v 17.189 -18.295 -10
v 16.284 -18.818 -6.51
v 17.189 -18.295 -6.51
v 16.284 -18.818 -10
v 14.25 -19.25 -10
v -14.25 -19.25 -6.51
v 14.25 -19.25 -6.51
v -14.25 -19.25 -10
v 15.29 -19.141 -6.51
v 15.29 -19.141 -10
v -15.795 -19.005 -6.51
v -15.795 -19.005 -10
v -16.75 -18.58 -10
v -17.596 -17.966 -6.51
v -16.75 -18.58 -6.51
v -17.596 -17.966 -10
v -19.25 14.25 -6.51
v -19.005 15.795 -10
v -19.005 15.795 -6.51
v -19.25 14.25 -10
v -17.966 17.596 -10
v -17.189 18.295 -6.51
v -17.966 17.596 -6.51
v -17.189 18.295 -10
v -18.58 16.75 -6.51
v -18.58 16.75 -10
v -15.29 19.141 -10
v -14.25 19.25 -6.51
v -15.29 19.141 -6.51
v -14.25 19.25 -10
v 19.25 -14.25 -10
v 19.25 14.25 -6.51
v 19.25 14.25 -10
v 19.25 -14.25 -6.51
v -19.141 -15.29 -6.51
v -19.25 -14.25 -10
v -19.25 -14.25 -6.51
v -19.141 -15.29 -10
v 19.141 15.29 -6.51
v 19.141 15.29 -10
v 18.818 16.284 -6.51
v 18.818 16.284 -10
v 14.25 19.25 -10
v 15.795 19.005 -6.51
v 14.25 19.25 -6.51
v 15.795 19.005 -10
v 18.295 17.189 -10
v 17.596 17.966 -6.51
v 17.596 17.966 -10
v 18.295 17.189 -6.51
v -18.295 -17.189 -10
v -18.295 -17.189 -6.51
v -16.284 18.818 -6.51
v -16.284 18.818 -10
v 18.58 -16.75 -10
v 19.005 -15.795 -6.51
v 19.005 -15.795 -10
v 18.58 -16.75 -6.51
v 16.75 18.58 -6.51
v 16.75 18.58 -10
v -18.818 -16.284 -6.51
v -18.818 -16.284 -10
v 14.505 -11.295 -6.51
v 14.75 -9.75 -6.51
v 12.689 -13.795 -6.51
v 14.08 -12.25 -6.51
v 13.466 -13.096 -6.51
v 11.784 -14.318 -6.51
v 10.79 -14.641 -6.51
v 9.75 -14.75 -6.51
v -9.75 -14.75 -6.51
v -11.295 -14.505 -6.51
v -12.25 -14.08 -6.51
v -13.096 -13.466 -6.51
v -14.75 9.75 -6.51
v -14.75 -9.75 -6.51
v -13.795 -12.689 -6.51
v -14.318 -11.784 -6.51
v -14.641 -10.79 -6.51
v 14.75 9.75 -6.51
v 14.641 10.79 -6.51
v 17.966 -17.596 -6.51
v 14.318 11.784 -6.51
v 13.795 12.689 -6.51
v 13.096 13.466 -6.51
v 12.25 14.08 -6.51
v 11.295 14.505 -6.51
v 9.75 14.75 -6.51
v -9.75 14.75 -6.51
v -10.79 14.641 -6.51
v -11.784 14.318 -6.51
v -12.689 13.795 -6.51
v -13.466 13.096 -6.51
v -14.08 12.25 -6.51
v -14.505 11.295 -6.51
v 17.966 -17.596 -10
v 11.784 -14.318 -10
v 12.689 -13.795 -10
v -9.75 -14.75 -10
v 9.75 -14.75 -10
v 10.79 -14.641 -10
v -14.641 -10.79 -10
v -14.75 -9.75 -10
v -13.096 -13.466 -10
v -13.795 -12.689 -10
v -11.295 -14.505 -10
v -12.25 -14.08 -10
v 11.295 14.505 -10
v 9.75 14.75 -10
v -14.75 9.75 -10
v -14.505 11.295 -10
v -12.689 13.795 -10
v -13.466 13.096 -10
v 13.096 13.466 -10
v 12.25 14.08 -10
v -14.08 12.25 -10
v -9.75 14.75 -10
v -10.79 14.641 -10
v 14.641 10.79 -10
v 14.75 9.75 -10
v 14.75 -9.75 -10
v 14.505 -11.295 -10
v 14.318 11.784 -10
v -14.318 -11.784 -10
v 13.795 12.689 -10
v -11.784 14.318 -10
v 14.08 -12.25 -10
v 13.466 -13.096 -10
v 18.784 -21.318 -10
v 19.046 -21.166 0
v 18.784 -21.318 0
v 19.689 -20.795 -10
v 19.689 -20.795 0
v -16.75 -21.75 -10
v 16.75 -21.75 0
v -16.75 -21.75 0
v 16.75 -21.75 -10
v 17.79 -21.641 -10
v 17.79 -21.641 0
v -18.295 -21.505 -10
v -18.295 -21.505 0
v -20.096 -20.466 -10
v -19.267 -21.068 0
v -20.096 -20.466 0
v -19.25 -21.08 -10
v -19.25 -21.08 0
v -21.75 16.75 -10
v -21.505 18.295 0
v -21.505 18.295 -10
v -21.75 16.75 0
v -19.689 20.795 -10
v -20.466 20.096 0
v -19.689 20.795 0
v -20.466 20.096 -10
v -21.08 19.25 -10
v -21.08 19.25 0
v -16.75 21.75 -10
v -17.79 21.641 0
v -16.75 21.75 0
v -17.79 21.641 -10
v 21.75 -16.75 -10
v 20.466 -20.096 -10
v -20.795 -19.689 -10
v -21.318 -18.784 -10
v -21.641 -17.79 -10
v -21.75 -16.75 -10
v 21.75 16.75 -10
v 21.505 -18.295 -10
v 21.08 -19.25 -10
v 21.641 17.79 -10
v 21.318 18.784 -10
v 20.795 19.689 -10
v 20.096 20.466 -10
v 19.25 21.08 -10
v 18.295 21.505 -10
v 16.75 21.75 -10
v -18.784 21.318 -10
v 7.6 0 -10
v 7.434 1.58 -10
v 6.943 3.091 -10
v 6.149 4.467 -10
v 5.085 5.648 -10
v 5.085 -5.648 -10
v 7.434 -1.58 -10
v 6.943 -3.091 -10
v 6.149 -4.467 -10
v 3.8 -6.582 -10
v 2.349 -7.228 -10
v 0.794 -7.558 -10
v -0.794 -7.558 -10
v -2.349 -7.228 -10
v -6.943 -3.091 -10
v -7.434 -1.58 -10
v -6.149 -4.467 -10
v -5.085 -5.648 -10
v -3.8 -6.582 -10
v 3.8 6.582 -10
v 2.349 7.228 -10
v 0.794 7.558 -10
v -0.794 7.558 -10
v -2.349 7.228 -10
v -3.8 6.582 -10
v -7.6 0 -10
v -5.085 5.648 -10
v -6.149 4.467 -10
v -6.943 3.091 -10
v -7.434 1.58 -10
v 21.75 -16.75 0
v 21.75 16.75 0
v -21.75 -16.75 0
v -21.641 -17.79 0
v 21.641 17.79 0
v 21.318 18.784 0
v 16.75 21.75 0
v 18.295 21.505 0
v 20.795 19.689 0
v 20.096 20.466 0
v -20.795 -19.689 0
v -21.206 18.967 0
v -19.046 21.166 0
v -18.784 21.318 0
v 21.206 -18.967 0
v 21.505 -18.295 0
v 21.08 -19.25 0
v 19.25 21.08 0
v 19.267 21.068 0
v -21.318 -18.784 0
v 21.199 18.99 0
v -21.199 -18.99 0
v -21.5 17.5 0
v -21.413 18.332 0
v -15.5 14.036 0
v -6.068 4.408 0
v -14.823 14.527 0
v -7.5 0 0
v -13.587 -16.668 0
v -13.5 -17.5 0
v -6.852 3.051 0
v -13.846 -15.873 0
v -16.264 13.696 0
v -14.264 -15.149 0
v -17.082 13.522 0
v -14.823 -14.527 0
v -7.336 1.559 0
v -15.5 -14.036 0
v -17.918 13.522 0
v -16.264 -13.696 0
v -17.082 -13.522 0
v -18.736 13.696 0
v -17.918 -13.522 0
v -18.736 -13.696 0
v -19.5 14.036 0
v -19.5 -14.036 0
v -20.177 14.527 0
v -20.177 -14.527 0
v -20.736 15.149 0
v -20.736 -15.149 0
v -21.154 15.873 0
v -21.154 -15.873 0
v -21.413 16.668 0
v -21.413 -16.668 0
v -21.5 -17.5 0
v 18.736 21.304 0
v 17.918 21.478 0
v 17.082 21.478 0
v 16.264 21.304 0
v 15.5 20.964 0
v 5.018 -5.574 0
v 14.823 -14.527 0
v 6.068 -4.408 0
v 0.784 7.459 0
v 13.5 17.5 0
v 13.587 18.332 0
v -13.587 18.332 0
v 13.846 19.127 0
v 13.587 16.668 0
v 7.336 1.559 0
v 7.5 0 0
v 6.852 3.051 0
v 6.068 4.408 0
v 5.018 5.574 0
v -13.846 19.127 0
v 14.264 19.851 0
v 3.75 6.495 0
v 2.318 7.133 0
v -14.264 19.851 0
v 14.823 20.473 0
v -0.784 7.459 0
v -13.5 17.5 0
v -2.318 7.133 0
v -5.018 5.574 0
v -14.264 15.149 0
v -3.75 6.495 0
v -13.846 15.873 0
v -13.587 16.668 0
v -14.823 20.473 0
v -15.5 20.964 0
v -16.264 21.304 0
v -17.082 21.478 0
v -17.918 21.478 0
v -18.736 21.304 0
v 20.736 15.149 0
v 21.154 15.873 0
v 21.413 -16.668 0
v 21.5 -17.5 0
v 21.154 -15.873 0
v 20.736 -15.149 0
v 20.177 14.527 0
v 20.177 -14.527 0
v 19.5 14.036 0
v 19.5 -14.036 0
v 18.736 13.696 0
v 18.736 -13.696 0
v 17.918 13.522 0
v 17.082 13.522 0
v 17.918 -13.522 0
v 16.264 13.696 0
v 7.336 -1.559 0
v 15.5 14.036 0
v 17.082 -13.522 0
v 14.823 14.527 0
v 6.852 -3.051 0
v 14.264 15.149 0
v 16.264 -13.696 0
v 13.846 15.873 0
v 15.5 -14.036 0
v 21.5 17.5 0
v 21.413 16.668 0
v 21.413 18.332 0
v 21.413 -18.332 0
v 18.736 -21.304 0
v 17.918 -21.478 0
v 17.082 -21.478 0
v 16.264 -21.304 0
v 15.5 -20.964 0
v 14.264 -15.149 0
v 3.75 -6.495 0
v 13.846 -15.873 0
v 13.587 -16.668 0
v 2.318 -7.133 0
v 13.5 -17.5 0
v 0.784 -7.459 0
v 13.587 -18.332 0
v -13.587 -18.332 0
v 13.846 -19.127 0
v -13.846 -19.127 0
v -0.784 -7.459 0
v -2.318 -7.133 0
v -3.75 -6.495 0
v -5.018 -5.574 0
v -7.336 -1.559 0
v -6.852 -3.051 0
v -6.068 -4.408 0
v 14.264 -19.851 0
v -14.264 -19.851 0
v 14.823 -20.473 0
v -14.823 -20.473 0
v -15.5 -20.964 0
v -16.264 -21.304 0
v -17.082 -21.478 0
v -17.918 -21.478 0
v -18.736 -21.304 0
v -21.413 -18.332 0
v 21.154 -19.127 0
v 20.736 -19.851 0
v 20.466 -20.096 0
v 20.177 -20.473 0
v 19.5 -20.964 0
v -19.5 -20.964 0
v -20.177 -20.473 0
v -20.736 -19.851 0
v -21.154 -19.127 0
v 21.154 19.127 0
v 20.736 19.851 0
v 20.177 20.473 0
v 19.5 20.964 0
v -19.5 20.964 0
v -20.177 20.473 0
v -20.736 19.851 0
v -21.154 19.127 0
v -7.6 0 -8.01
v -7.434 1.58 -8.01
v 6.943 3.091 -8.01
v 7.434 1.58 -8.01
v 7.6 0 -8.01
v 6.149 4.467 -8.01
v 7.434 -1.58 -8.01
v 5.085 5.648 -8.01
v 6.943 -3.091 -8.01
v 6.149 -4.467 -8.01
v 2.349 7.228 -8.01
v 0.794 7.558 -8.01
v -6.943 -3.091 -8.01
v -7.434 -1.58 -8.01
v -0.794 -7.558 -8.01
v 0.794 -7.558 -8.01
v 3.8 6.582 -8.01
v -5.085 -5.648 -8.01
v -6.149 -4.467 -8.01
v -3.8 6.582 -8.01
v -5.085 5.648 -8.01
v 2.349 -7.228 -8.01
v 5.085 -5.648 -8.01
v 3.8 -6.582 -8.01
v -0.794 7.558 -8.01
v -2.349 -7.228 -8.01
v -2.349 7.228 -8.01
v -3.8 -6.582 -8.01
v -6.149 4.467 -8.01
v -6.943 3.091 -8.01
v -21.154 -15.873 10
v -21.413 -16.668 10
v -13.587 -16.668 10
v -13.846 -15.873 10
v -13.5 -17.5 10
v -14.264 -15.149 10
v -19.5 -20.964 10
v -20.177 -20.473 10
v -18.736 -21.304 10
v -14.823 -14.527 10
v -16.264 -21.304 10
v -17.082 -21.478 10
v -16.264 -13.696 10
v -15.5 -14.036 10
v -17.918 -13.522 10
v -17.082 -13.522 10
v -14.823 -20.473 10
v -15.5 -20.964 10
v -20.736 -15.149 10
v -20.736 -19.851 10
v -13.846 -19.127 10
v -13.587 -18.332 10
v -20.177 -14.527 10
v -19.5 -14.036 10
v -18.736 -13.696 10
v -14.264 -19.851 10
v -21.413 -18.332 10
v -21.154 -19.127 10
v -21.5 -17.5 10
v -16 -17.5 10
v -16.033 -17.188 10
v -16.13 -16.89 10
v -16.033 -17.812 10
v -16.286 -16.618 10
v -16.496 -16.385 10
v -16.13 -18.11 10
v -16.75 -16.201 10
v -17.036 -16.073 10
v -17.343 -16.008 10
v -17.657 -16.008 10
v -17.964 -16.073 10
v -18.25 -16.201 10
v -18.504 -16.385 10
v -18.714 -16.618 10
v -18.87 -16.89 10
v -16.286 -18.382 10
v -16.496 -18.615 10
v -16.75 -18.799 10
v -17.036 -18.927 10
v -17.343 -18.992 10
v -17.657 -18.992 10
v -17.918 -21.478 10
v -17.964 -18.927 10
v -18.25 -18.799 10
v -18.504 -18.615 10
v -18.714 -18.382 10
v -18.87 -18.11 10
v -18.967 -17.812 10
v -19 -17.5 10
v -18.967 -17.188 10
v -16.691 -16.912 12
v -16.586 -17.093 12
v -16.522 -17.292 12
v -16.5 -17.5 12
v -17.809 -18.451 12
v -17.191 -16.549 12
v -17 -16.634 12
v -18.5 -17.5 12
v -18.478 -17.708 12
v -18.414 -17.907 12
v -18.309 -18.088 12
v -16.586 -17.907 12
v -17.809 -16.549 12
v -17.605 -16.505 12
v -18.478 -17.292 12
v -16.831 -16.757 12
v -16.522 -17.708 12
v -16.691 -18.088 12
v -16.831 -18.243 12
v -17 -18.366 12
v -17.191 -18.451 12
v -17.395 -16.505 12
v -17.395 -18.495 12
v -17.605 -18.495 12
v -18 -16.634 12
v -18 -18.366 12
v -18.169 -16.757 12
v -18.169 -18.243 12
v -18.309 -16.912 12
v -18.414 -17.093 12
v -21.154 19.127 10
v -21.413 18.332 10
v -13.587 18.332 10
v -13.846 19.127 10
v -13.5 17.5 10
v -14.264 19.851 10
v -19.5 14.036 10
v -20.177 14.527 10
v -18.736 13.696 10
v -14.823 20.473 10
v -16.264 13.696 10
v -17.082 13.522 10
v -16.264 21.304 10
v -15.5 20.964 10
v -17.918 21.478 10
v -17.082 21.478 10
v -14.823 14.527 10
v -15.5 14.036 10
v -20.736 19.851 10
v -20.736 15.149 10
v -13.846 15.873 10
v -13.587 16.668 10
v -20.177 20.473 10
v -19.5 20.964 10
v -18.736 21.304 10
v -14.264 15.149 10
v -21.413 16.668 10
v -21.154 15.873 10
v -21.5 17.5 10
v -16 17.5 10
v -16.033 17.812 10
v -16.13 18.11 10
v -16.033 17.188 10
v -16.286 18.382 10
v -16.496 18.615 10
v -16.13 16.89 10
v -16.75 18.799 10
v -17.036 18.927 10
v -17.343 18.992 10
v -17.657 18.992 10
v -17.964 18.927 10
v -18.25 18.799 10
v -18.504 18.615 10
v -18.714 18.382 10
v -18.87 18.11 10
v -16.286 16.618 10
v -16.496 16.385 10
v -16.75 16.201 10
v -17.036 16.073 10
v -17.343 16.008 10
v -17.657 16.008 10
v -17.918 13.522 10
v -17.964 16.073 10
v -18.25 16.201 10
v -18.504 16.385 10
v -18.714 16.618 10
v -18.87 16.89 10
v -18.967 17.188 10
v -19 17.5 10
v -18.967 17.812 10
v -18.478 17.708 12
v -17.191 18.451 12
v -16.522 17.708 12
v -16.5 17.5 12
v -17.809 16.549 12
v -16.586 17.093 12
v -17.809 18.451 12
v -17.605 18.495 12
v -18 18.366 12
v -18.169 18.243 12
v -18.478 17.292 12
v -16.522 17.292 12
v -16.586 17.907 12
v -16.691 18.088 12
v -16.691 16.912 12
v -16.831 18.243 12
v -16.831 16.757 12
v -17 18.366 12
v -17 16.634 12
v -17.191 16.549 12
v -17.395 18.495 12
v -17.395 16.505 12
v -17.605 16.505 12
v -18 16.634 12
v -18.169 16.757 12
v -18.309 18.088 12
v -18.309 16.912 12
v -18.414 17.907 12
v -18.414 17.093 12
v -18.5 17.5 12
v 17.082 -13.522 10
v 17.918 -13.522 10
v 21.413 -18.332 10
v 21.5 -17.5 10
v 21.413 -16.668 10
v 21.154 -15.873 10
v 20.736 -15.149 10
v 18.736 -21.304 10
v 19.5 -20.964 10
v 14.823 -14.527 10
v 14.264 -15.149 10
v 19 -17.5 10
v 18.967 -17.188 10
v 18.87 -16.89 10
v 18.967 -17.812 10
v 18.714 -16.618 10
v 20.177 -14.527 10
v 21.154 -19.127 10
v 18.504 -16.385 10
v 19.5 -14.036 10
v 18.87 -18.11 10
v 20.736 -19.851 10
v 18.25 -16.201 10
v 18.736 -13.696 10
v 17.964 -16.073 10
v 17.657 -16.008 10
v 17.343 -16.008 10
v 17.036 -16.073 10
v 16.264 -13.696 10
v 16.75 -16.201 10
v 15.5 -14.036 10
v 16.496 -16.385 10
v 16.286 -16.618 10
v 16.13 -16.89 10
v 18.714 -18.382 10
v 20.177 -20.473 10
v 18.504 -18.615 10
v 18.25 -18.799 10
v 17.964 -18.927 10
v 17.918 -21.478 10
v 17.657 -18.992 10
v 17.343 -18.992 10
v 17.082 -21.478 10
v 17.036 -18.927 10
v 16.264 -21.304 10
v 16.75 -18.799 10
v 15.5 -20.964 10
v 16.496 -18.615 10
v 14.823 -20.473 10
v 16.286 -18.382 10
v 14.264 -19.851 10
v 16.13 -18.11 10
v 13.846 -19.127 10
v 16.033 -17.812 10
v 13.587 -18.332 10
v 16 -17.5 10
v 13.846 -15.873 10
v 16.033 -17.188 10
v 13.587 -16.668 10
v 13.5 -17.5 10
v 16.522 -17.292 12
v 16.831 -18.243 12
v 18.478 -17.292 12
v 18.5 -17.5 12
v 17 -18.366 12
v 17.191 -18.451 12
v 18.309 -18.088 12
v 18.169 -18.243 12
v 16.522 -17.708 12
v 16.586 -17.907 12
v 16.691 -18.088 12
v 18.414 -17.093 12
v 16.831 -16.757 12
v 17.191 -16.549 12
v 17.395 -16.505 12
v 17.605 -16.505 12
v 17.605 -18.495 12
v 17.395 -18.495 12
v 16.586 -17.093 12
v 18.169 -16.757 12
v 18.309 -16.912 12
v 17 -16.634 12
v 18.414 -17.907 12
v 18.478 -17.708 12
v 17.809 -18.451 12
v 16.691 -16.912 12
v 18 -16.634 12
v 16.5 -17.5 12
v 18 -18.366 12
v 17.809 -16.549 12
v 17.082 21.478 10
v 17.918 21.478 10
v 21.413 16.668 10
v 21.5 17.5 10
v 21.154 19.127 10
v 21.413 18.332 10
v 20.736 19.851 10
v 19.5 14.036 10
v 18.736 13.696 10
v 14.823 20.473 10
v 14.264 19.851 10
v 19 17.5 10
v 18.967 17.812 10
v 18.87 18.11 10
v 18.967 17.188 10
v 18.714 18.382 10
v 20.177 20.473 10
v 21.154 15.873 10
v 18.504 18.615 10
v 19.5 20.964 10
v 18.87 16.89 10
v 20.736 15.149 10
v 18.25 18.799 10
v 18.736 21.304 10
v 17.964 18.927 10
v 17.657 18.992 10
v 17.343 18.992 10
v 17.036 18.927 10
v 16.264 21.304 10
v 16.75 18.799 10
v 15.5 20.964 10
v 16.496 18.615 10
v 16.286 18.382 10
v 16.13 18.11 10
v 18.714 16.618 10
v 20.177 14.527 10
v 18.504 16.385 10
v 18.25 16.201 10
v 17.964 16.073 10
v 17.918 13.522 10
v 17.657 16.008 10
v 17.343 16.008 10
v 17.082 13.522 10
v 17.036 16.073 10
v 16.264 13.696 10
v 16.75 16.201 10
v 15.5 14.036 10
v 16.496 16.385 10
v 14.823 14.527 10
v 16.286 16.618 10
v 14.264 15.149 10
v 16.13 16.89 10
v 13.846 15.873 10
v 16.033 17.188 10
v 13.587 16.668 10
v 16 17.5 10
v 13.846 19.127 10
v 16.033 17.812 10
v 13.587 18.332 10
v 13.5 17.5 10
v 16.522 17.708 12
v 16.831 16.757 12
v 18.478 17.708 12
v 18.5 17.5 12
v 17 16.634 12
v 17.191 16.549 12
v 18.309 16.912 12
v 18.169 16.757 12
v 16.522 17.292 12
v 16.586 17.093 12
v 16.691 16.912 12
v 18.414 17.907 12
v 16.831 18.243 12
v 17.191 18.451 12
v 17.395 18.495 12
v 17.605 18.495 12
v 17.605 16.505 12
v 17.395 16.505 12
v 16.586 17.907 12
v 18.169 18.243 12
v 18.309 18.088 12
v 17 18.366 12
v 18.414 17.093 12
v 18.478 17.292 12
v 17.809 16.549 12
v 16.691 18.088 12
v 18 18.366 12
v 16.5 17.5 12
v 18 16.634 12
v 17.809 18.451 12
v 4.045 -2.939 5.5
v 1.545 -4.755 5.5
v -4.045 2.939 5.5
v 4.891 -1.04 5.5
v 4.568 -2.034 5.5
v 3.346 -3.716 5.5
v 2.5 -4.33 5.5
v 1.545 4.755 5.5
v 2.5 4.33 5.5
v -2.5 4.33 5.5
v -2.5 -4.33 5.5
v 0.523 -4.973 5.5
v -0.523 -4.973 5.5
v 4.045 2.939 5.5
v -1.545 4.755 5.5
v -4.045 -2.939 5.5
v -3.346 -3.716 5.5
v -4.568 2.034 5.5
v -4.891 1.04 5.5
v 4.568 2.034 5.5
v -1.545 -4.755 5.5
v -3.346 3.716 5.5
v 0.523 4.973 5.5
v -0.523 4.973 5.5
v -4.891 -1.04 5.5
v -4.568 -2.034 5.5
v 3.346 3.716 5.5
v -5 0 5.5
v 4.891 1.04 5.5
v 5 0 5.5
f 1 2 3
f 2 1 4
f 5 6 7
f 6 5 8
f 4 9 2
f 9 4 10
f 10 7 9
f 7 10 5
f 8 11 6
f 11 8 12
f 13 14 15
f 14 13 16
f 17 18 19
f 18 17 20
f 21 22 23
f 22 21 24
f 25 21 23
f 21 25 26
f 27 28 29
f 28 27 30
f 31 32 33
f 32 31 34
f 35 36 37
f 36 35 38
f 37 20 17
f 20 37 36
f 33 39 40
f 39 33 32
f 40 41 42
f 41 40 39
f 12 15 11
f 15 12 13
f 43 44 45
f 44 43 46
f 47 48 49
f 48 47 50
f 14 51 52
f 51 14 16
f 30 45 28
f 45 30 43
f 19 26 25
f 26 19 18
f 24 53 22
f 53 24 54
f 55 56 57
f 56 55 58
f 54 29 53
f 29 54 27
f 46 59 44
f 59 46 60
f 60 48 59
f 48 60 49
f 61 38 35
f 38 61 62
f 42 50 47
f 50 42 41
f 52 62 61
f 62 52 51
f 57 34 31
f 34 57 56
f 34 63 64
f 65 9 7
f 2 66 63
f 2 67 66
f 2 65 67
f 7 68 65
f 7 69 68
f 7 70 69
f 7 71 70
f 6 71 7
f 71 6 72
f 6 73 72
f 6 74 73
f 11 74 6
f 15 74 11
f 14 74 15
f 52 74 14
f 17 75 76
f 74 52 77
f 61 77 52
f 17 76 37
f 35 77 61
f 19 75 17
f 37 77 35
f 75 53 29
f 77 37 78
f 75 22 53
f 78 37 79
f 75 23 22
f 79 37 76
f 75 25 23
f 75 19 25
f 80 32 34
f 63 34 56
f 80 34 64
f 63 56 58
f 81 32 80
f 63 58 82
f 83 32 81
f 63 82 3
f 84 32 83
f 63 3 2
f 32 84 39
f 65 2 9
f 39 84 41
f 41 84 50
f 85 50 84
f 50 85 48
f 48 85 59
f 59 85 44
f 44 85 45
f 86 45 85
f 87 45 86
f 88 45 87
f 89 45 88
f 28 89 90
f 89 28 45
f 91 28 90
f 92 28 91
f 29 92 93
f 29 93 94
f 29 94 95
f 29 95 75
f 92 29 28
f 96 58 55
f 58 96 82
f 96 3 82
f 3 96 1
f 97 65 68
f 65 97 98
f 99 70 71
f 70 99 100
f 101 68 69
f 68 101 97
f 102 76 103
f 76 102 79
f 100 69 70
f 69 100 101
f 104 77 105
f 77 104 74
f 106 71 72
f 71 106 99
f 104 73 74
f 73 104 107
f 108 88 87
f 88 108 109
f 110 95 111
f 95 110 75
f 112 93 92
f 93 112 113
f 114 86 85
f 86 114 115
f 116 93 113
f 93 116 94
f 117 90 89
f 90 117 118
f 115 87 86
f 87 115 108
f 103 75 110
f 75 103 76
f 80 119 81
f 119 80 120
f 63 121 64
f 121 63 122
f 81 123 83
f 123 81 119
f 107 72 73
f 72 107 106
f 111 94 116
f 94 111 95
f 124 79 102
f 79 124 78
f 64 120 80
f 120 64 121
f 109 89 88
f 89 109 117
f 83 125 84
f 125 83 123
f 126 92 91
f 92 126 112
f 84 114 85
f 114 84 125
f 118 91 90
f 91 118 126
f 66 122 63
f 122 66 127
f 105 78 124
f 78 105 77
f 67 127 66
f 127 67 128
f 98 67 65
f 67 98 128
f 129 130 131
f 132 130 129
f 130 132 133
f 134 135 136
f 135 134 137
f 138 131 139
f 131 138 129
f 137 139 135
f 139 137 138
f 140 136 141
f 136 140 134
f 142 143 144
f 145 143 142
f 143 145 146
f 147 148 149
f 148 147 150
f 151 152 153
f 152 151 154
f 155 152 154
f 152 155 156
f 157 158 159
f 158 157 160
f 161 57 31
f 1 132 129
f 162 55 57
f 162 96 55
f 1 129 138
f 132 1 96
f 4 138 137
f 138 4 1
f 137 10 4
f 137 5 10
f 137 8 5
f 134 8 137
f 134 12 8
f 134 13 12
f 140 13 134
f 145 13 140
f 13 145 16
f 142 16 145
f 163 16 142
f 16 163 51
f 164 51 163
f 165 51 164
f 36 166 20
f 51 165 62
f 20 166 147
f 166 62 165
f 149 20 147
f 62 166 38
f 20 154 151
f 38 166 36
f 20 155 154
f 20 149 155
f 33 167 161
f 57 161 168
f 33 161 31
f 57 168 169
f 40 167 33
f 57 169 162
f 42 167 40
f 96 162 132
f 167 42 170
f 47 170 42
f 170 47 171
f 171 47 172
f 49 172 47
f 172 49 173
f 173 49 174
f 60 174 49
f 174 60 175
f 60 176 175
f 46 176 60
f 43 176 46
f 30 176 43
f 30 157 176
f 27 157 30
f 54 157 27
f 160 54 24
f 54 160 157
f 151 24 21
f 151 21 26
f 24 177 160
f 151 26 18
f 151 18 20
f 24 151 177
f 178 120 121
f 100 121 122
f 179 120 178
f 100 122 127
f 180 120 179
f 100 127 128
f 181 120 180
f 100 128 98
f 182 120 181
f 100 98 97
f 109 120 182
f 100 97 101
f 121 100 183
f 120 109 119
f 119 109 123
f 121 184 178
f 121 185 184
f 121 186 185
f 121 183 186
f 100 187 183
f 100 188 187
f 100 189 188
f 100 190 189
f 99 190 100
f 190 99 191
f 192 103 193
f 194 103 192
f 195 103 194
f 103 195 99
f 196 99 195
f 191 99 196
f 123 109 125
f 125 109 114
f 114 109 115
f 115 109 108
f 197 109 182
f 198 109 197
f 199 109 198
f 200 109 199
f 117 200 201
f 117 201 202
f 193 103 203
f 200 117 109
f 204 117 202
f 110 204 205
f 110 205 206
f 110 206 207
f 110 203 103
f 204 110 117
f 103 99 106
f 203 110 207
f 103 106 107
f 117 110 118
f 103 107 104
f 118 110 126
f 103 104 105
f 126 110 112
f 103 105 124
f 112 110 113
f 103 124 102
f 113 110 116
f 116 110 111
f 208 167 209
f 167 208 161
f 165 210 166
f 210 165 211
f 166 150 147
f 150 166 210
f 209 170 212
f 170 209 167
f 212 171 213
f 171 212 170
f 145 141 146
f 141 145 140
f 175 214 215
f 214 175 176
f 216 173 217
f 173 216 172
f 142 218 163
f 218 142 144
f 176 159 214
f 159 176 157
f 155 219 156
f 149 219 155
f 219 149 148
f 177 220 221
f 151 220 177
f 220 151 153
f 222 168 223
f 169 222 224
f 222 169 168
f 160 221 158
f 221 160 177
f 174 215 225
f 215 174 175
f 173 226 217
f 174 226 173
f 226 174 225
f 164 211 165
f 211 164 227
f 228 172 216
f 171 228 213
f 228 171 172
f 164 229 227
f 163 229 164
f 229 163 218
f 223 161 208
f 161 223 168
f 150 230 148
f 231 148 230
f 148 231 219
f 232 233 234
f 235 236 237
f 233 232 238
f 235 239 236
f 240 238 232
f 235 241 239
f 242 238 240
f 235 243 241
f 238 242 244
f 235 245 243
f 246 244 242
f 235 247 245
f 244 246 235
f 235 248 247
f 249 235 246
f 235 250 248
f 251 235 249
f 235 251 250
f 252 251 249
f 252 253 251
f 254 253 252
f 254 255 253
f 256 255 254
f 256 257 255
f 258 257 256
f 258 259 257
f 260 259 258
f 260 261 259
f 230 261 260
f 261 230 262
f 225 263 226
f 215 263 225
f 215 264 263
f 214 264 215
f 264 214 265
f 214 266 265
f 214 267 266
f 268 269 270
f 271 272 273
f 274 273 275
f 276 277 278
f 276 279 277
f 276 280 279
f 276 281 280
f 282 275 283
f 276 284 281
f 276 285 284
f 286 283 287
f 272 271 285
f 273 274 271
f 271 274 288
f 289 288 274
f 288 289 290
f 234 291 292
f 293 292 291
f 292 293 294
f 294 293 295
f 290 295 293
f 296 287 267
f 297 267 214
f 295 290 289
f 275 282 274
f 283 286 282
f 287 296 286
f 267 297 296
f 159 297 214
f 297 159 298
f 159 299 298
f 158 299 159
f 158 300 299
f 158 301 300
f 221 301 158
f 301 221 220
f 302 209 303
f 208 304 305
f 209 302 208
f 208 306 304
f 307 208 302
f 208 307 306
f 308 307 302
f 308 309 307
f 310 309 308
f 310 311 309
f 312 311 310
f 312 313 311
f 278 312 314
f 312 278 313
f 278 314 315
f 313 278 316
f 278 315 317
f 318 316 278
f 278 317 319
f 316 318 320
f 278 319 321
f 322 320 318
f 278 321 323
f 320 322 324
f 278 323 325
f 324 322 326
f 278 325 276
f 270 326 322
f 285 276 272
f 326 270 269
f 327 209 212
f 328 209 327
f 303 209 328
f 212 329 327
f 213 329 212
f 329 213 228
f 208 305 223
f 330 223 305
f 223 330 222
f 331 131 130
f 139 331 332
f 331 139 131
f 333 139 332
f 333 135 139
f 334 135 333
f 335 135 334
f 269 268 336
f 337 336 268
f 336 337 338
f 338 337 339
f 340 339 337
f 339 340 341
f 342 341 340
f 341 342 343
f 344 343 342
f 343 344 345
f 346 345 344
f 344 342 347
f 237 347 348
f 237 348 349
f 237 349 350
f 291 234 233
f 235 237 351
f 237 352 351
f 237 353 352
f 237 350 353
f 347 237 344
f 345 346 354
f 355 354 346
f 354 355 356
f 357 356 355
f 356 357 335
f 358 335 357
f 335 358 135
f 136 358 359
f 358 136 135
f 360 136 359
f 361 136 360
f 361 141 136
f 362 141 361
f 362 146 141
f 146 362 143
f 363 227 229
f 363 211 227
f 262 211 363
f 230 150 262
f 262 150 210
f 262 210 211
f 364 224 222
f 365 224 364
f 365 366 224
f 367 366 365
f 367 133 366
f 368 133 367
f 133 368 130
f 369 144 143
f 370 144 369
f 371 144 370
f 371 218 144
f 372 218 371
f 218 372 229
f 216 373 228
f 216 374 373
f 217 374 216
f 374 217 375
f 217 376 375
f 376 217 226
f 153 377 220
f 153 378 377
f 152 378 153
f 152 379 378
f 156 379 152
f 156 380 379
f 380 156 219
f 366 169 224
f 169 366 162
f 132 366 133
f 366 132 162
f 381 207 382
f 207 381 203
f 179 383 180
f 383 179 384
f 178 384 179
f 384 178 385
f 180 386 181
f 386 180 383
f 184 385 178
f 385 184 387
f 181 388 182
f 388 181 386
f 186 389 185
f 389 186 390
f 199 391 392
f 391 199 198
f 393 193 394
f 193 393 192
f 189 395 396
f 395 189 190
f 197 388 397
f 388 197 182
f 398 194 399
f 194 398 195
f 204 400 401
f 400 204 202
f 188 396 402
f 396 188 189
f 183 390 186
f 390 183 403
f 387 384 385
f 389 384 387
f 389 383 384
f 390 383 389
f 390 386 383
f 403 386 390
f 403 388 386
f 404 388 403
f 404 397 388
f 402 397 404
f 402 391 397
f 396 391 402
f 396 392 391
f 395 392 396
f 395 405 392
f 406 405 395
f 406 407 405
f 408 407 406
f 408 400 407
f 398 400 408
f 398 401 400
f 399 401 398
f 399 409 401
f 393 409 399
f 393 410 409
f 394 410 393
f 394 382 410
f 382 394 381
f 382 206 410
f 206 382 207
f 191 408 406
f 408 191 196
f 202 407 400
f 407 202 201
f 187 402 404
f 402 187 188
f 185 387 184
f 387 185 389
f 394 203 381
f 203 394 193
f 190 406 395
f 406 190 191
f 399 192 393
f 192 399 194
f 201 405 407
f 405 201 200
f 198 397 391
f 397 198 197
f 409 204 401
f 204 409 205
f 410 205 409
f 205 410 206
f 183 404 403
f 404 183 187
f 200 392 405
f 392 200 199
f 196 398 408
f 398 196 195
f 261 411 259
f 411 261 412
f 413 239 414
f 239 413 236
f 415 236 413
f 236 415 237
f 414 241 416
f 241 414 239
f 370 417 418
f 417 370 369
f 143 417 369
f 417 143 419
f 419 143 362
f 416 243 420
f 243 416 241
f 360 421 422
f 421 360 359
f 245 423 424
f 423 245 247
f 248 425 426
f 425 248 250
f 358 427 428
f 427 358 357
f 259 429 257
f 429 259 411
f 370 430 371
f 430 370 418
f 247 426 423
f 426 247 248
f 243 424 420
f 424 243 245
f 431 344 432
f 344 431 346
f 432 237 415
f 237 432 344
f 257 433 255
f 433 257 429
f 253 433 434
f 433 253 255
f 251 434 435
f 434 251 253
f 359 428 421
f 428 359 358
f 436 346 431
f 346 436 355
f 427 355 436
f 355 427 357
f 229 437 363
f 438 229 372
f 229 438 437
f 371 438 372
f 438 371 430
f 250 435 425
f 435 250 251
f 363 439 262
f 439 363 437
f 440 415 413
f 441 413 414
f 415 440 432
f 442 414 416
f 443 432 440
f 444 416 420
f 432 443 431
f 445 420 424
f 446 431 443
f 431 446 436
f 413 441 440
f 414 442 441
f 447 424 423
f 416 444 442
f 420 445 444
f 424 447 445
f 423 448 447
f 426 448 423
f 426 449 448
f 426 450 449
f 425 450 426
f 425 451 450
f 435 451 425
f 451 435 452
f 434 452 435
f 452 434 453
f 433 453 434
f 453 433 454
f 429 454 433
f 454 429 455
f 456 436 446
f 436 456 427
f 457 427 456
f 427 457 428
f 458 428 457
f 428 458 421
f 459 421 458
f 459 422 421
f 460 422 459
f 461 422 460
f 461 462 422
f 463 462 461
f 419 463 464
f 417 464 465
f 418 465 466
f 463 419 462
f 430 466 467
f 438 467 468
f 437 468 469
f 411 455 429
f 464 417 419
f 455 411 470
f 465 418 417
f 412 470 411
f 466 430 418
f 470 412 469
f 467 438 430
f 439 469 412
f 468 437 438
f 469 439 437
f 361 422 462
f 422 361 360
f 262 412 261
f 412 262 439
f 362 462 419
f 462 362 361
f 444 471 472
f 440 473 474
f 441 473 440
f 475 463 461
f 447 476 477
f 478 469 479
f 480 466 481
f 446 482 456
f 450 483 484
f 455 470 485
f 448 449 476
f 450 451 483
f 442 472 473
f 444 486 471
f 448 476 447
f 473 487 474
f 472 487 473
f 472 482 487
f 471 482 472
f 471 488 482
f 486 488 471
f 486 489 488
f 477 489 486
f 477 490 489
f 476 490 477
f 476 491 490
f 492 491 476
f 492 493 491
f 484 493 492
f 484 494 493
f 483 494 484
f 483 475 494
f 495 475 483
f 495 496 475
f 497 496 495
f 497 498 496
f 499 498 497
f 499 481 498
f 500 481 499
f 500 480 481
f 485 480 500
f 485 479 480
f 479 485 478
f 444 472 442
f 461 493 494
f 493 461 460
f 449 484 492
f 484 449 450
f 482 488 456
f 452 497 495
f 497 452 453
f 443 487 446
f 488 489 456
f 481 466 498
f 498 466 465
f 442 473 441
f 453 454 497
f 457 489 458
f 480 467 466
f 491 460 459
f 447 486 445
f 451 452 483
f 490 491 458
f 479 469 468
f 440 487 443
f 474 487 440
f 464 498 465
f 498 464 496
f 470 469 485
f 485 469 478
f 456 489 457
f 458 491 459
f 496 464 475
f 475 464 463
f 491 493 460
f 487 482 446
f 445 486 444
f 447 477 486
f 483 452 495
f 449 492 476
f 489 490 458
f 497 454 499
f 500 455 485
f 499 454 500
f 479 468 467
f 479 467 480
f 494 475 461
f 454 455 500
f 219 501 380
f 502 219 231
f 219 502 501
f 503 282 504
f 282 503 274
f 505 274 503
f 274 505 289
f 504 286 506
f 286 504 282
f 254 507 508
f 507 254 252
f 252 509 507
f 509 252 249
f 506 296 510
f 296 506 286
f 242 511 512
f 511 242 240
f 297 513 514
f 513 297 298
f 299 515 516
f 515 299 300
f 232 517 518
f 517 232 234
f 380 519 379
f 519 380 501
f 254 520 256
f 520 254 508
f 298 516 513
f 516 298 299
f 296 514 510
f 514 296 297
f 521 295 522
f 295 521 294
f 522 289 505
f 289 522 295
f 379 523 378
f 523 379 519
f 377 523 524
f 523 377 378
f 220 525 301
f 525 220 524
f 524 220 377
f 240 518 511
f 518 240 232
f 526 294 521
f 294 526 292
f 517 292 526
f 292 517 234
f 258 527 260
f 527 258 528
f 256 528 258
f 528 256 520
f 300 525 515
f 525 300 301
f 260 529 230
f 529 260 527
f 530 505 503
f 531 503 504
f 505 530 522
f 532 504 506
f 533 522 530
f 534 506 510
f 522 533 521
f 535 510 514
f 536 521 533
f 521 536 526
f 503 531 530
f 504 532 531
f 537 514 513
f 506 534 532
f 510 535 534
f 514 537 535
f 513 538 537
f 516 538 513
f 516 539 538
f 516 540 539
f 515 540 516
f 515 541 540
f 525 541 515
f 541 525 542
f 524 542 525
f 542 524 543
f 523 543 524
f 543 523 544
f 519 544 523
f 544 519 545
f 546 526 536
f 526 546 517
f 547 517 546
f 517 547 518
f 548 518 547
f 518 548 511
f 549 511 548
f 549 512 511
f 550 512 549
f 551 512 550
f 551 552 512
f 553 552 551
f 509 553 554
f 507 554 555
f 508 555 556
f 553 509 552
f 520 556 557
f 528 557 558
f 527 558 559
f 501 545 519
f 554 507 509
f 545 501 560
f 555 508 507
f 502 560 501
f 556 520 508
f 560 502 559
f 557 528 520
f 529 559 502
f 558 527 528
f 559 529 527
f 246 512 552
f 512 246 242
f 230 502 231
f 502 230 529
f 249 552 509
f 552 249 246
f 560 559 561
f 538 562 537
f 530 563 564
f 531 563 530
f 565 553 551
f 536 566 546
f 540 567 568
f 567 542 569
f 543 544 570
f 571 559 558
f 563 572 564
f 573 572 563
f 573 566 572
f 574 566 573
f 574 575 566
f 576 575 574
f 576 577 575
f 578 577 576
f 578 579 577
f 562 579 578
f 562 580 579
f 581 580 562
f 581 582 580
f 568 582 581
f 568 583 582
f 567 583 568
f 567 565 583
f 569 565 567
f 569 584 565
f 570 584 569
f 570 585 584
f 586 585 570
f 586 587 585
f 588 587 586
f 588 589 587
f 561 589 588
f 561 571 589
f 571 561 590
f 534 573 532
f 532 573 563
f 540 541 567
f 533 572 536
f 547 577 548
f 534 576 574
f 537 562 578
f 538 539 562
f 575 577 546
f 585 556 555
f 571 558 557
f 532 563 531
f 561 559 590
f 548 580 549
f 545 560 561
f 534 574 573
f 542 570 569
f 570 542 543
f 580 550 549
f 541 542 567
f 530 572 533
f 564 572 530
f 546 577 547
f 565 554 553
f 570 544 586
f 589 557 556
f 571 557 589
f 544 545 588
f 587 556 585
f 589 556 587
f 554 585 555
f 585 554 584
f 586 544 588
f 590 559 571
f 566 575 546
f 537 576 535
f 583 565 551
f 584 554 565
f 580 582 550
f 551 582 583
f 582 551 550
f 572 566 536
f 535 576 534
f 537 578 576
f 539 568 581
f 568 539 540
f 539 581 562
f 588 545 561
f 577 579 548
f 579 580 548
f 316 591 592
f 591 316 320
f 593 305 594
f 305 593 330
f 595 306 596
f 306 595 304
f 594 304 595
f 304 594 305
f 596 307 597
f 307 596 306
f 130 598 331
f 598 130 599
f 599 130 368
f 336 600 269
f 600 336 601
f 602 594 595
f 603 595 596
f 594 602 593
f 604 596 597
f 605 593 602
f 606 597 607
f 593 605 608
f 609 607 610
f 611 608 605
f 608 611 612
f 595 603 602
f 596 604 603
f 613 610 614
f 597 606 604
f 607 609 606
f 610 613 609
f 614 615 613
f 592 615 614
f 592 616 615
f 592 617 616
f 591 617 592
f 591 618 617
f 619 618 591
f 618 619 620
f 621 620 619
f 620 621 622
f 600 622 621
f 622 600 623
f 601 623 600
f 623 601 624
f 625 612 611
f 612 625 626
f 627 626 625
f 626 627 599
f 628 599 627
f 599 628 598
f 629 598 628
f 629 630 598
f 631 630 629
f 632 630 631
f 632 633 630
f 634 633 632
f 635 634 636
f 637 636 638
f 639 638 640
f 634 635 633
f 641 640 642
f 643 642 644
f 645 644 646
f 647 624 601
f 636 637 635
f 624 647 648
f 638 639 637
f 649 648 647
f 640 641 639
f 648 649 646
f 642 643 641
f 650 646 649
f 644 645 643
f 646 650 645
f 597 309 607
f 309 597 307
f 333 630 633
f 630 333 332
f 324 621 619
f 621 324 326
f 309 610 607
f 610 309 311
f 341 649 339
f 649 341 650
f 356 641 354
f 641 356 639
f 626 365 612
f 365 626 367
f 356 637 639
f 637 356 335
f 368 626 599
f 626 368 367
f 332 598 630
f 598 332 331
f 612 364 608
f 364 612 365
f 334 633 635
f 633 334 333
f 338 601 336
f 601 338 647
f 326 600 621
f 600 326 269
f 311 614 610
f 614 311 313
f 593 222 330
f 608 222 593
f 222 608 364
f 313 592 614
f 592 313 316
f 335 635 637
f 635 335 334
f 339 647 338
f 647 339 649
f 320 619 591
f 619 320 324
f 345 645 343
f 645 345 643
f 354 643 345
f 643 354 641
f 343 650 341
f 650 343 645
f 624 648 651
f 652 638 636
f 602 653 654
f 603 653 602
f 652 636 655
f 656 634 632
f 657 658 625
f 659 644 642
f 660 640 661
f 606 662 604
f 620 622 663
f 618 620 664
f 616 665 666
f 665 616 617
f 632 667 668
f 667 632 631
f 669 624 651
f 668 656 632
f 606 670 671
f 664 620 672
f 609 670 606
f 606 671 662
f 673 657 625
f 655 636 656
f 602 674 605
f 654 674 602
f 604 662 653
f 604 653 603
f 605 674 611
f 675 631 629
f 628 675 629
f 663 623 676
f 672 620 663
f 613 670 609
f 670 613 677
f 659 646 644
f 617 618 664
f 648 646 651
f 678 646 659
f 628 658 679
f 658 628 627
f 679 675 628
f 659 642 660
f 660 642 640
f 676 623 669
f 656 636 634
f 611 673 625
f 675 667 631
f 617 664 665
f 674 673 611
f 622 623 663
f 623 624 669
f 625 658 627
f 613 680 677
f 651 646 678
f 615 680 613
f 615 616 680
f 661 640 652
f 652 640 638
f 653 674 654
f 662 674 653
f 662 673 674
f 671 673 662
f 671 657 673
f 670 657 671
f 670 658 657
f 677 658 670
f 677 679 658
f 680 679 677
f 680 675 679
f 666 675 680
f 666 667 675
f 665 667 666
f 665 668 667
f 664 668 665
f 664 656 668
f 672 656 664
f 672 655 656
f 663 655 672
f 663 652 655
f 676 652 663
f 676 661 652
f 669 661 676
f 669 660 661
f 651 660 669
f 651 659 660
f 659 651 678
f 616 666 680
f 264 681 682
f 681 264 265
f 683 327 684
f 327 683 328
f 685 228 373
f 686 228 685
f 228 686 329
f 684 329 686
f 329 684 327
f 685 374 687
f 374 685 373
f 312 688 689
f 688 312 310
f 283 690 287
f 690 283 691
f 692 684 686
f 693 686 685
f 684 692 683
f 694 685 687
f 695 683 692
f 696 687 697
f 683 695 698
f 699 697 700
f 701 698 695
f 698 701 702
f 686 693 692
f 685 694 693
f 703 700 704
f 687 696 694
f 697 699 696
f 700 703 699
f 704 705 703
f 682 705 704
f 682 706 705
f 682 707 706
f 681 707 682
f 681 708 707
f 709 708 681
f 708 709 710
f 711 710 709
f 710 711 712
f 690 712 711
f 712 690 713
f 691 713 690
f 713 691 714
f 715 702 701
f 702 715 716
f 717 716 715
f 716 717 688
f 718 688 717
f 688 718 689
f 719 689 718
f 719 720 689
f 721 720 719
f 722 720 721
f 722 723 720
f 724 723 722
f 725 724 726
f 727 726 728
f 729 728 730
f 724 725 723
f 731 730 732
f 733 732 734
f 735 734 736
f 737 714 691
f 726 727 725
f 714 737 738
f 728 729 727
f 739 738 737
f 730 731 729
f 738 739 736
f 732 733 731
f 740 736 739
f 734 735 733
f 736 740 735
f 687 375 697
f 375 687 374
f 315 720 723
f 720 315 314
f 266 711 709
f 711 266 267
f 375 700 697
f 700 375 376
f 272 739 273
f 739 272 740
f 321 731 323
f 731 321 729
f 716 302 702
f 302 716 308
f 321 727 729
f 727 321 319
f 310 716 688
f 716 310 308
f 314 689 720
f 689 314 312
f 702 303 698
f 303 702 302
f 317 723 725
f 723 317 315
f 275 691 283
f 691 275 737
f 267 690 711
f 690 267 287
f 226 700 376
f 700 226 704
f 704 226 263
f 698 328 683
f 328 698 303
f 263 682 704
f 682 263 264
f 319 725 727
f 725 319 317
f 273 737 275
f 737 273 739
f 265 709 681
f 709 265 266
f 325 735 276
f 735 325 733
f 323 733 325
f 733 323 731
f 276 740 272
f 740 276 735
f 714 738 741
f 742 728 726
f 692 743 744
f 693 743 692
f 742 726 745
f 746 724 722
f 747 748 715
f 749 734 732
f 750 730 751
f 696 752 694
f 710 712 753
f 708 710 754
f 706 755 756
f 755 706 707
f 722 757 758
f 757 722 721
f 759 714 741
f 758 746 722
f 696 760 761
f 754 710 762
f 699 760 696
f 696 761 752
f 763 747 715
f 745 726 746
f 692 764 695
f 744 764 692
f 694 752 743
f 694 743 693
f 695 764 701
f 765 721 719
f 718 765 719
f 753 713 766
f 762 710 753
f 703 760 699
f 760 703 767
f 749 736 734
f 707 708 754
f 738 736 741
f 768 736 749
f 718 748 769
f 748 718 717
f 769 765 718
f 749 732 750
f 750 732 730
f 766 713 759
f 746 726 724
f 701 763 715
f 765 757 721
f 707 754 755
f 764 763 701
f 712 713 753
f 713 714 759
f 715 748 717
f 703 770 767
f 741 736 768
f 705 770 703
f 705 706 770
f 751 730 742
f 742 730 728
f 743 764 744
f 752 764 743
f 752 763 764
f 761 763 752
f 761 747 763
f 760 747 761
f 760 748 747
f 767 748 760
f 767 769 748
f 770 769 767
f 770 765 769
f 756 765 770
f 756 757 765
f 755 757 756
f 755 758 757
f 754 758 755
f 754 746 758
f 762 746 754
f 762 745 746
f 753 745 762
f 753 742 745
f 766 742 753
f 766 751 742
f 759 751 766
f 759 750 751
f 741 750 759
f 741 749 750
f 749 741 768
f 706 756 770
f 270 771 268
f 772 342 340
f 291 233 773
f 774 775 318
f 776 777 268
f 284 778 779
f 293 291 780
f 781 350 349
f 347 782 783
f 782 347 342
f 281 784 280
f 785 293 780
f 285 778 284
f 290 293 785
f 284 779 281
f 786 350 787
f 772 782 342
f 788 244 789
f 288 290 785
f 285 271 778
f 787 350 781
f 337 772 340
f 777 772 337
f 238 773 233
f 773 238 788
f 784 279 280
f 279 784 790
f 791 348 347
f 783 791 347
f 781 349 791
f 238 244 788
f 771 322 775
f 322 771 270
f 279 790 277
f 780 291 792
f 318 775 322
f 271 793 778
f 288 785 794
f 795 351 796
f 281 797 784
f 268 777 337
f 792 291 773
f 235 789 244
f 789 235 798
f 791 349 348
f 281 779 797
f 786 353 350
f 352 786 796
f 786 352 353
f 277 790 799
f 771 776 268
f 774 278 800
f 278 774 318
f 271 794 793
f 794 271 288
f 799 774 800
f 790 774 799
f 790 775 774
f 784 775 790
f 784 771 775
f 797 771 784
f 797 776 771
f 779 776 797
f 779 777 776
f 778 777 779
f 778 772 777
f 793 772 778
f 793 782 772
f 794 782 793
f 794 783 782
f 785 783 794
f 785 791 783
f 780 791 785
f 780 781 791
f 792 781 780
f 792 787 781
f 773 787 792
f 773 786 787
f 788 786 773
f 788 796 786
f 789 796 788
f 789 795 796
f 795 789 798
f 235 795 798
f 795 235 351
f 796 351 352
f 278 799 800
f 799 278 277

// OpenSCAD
SCREW_CENTERS = 35;
PCB_W = 43 + 0.5;
TERM_H = 10;
MIC_H = 4.5;
BASE = 10;

$fn = 30;


// Base
difference() {
  translate([-PCB_W/2,-PCB_W/2,-BASE]) linear_extrude(BASE) offset(5) offset(-5) square([PCB_W, PCB_W]);
  
  // Gasket
  translate([0,0,-BASE-0.01]) difference() {
    G1 = PCB_W - 5;
    G2 = G1 - 2*4.5;
    translate([-G1/2, -G1/2, 0]) linear_extrude(3.5) offset(5) offset(-5) square(G1);
    translate([-G2/2, -G2/2, 0]) linear_extrude(3.5) offset(5) offset(-5) square(G2);
  }
  
  // Magnetic
  translate([0,0,-BASE-0.01]) cylinder(d=15.2,h=2);
}

// Mic stand
cylinder(r1=7.5, r2=5, h= TERM_H -MIC_H);

// Stands
SH = SCREW_CENTERS/2;
for (x=[-SH,SH]) for (y=[-SH,SH]) {
  translate([x,y,0]) cylinder(r=4,h=TERM_H);
  translate([x,y,TERM_H]) cylinder(r1=3/2, r2=(3/2)-0.5,h=2);
}
